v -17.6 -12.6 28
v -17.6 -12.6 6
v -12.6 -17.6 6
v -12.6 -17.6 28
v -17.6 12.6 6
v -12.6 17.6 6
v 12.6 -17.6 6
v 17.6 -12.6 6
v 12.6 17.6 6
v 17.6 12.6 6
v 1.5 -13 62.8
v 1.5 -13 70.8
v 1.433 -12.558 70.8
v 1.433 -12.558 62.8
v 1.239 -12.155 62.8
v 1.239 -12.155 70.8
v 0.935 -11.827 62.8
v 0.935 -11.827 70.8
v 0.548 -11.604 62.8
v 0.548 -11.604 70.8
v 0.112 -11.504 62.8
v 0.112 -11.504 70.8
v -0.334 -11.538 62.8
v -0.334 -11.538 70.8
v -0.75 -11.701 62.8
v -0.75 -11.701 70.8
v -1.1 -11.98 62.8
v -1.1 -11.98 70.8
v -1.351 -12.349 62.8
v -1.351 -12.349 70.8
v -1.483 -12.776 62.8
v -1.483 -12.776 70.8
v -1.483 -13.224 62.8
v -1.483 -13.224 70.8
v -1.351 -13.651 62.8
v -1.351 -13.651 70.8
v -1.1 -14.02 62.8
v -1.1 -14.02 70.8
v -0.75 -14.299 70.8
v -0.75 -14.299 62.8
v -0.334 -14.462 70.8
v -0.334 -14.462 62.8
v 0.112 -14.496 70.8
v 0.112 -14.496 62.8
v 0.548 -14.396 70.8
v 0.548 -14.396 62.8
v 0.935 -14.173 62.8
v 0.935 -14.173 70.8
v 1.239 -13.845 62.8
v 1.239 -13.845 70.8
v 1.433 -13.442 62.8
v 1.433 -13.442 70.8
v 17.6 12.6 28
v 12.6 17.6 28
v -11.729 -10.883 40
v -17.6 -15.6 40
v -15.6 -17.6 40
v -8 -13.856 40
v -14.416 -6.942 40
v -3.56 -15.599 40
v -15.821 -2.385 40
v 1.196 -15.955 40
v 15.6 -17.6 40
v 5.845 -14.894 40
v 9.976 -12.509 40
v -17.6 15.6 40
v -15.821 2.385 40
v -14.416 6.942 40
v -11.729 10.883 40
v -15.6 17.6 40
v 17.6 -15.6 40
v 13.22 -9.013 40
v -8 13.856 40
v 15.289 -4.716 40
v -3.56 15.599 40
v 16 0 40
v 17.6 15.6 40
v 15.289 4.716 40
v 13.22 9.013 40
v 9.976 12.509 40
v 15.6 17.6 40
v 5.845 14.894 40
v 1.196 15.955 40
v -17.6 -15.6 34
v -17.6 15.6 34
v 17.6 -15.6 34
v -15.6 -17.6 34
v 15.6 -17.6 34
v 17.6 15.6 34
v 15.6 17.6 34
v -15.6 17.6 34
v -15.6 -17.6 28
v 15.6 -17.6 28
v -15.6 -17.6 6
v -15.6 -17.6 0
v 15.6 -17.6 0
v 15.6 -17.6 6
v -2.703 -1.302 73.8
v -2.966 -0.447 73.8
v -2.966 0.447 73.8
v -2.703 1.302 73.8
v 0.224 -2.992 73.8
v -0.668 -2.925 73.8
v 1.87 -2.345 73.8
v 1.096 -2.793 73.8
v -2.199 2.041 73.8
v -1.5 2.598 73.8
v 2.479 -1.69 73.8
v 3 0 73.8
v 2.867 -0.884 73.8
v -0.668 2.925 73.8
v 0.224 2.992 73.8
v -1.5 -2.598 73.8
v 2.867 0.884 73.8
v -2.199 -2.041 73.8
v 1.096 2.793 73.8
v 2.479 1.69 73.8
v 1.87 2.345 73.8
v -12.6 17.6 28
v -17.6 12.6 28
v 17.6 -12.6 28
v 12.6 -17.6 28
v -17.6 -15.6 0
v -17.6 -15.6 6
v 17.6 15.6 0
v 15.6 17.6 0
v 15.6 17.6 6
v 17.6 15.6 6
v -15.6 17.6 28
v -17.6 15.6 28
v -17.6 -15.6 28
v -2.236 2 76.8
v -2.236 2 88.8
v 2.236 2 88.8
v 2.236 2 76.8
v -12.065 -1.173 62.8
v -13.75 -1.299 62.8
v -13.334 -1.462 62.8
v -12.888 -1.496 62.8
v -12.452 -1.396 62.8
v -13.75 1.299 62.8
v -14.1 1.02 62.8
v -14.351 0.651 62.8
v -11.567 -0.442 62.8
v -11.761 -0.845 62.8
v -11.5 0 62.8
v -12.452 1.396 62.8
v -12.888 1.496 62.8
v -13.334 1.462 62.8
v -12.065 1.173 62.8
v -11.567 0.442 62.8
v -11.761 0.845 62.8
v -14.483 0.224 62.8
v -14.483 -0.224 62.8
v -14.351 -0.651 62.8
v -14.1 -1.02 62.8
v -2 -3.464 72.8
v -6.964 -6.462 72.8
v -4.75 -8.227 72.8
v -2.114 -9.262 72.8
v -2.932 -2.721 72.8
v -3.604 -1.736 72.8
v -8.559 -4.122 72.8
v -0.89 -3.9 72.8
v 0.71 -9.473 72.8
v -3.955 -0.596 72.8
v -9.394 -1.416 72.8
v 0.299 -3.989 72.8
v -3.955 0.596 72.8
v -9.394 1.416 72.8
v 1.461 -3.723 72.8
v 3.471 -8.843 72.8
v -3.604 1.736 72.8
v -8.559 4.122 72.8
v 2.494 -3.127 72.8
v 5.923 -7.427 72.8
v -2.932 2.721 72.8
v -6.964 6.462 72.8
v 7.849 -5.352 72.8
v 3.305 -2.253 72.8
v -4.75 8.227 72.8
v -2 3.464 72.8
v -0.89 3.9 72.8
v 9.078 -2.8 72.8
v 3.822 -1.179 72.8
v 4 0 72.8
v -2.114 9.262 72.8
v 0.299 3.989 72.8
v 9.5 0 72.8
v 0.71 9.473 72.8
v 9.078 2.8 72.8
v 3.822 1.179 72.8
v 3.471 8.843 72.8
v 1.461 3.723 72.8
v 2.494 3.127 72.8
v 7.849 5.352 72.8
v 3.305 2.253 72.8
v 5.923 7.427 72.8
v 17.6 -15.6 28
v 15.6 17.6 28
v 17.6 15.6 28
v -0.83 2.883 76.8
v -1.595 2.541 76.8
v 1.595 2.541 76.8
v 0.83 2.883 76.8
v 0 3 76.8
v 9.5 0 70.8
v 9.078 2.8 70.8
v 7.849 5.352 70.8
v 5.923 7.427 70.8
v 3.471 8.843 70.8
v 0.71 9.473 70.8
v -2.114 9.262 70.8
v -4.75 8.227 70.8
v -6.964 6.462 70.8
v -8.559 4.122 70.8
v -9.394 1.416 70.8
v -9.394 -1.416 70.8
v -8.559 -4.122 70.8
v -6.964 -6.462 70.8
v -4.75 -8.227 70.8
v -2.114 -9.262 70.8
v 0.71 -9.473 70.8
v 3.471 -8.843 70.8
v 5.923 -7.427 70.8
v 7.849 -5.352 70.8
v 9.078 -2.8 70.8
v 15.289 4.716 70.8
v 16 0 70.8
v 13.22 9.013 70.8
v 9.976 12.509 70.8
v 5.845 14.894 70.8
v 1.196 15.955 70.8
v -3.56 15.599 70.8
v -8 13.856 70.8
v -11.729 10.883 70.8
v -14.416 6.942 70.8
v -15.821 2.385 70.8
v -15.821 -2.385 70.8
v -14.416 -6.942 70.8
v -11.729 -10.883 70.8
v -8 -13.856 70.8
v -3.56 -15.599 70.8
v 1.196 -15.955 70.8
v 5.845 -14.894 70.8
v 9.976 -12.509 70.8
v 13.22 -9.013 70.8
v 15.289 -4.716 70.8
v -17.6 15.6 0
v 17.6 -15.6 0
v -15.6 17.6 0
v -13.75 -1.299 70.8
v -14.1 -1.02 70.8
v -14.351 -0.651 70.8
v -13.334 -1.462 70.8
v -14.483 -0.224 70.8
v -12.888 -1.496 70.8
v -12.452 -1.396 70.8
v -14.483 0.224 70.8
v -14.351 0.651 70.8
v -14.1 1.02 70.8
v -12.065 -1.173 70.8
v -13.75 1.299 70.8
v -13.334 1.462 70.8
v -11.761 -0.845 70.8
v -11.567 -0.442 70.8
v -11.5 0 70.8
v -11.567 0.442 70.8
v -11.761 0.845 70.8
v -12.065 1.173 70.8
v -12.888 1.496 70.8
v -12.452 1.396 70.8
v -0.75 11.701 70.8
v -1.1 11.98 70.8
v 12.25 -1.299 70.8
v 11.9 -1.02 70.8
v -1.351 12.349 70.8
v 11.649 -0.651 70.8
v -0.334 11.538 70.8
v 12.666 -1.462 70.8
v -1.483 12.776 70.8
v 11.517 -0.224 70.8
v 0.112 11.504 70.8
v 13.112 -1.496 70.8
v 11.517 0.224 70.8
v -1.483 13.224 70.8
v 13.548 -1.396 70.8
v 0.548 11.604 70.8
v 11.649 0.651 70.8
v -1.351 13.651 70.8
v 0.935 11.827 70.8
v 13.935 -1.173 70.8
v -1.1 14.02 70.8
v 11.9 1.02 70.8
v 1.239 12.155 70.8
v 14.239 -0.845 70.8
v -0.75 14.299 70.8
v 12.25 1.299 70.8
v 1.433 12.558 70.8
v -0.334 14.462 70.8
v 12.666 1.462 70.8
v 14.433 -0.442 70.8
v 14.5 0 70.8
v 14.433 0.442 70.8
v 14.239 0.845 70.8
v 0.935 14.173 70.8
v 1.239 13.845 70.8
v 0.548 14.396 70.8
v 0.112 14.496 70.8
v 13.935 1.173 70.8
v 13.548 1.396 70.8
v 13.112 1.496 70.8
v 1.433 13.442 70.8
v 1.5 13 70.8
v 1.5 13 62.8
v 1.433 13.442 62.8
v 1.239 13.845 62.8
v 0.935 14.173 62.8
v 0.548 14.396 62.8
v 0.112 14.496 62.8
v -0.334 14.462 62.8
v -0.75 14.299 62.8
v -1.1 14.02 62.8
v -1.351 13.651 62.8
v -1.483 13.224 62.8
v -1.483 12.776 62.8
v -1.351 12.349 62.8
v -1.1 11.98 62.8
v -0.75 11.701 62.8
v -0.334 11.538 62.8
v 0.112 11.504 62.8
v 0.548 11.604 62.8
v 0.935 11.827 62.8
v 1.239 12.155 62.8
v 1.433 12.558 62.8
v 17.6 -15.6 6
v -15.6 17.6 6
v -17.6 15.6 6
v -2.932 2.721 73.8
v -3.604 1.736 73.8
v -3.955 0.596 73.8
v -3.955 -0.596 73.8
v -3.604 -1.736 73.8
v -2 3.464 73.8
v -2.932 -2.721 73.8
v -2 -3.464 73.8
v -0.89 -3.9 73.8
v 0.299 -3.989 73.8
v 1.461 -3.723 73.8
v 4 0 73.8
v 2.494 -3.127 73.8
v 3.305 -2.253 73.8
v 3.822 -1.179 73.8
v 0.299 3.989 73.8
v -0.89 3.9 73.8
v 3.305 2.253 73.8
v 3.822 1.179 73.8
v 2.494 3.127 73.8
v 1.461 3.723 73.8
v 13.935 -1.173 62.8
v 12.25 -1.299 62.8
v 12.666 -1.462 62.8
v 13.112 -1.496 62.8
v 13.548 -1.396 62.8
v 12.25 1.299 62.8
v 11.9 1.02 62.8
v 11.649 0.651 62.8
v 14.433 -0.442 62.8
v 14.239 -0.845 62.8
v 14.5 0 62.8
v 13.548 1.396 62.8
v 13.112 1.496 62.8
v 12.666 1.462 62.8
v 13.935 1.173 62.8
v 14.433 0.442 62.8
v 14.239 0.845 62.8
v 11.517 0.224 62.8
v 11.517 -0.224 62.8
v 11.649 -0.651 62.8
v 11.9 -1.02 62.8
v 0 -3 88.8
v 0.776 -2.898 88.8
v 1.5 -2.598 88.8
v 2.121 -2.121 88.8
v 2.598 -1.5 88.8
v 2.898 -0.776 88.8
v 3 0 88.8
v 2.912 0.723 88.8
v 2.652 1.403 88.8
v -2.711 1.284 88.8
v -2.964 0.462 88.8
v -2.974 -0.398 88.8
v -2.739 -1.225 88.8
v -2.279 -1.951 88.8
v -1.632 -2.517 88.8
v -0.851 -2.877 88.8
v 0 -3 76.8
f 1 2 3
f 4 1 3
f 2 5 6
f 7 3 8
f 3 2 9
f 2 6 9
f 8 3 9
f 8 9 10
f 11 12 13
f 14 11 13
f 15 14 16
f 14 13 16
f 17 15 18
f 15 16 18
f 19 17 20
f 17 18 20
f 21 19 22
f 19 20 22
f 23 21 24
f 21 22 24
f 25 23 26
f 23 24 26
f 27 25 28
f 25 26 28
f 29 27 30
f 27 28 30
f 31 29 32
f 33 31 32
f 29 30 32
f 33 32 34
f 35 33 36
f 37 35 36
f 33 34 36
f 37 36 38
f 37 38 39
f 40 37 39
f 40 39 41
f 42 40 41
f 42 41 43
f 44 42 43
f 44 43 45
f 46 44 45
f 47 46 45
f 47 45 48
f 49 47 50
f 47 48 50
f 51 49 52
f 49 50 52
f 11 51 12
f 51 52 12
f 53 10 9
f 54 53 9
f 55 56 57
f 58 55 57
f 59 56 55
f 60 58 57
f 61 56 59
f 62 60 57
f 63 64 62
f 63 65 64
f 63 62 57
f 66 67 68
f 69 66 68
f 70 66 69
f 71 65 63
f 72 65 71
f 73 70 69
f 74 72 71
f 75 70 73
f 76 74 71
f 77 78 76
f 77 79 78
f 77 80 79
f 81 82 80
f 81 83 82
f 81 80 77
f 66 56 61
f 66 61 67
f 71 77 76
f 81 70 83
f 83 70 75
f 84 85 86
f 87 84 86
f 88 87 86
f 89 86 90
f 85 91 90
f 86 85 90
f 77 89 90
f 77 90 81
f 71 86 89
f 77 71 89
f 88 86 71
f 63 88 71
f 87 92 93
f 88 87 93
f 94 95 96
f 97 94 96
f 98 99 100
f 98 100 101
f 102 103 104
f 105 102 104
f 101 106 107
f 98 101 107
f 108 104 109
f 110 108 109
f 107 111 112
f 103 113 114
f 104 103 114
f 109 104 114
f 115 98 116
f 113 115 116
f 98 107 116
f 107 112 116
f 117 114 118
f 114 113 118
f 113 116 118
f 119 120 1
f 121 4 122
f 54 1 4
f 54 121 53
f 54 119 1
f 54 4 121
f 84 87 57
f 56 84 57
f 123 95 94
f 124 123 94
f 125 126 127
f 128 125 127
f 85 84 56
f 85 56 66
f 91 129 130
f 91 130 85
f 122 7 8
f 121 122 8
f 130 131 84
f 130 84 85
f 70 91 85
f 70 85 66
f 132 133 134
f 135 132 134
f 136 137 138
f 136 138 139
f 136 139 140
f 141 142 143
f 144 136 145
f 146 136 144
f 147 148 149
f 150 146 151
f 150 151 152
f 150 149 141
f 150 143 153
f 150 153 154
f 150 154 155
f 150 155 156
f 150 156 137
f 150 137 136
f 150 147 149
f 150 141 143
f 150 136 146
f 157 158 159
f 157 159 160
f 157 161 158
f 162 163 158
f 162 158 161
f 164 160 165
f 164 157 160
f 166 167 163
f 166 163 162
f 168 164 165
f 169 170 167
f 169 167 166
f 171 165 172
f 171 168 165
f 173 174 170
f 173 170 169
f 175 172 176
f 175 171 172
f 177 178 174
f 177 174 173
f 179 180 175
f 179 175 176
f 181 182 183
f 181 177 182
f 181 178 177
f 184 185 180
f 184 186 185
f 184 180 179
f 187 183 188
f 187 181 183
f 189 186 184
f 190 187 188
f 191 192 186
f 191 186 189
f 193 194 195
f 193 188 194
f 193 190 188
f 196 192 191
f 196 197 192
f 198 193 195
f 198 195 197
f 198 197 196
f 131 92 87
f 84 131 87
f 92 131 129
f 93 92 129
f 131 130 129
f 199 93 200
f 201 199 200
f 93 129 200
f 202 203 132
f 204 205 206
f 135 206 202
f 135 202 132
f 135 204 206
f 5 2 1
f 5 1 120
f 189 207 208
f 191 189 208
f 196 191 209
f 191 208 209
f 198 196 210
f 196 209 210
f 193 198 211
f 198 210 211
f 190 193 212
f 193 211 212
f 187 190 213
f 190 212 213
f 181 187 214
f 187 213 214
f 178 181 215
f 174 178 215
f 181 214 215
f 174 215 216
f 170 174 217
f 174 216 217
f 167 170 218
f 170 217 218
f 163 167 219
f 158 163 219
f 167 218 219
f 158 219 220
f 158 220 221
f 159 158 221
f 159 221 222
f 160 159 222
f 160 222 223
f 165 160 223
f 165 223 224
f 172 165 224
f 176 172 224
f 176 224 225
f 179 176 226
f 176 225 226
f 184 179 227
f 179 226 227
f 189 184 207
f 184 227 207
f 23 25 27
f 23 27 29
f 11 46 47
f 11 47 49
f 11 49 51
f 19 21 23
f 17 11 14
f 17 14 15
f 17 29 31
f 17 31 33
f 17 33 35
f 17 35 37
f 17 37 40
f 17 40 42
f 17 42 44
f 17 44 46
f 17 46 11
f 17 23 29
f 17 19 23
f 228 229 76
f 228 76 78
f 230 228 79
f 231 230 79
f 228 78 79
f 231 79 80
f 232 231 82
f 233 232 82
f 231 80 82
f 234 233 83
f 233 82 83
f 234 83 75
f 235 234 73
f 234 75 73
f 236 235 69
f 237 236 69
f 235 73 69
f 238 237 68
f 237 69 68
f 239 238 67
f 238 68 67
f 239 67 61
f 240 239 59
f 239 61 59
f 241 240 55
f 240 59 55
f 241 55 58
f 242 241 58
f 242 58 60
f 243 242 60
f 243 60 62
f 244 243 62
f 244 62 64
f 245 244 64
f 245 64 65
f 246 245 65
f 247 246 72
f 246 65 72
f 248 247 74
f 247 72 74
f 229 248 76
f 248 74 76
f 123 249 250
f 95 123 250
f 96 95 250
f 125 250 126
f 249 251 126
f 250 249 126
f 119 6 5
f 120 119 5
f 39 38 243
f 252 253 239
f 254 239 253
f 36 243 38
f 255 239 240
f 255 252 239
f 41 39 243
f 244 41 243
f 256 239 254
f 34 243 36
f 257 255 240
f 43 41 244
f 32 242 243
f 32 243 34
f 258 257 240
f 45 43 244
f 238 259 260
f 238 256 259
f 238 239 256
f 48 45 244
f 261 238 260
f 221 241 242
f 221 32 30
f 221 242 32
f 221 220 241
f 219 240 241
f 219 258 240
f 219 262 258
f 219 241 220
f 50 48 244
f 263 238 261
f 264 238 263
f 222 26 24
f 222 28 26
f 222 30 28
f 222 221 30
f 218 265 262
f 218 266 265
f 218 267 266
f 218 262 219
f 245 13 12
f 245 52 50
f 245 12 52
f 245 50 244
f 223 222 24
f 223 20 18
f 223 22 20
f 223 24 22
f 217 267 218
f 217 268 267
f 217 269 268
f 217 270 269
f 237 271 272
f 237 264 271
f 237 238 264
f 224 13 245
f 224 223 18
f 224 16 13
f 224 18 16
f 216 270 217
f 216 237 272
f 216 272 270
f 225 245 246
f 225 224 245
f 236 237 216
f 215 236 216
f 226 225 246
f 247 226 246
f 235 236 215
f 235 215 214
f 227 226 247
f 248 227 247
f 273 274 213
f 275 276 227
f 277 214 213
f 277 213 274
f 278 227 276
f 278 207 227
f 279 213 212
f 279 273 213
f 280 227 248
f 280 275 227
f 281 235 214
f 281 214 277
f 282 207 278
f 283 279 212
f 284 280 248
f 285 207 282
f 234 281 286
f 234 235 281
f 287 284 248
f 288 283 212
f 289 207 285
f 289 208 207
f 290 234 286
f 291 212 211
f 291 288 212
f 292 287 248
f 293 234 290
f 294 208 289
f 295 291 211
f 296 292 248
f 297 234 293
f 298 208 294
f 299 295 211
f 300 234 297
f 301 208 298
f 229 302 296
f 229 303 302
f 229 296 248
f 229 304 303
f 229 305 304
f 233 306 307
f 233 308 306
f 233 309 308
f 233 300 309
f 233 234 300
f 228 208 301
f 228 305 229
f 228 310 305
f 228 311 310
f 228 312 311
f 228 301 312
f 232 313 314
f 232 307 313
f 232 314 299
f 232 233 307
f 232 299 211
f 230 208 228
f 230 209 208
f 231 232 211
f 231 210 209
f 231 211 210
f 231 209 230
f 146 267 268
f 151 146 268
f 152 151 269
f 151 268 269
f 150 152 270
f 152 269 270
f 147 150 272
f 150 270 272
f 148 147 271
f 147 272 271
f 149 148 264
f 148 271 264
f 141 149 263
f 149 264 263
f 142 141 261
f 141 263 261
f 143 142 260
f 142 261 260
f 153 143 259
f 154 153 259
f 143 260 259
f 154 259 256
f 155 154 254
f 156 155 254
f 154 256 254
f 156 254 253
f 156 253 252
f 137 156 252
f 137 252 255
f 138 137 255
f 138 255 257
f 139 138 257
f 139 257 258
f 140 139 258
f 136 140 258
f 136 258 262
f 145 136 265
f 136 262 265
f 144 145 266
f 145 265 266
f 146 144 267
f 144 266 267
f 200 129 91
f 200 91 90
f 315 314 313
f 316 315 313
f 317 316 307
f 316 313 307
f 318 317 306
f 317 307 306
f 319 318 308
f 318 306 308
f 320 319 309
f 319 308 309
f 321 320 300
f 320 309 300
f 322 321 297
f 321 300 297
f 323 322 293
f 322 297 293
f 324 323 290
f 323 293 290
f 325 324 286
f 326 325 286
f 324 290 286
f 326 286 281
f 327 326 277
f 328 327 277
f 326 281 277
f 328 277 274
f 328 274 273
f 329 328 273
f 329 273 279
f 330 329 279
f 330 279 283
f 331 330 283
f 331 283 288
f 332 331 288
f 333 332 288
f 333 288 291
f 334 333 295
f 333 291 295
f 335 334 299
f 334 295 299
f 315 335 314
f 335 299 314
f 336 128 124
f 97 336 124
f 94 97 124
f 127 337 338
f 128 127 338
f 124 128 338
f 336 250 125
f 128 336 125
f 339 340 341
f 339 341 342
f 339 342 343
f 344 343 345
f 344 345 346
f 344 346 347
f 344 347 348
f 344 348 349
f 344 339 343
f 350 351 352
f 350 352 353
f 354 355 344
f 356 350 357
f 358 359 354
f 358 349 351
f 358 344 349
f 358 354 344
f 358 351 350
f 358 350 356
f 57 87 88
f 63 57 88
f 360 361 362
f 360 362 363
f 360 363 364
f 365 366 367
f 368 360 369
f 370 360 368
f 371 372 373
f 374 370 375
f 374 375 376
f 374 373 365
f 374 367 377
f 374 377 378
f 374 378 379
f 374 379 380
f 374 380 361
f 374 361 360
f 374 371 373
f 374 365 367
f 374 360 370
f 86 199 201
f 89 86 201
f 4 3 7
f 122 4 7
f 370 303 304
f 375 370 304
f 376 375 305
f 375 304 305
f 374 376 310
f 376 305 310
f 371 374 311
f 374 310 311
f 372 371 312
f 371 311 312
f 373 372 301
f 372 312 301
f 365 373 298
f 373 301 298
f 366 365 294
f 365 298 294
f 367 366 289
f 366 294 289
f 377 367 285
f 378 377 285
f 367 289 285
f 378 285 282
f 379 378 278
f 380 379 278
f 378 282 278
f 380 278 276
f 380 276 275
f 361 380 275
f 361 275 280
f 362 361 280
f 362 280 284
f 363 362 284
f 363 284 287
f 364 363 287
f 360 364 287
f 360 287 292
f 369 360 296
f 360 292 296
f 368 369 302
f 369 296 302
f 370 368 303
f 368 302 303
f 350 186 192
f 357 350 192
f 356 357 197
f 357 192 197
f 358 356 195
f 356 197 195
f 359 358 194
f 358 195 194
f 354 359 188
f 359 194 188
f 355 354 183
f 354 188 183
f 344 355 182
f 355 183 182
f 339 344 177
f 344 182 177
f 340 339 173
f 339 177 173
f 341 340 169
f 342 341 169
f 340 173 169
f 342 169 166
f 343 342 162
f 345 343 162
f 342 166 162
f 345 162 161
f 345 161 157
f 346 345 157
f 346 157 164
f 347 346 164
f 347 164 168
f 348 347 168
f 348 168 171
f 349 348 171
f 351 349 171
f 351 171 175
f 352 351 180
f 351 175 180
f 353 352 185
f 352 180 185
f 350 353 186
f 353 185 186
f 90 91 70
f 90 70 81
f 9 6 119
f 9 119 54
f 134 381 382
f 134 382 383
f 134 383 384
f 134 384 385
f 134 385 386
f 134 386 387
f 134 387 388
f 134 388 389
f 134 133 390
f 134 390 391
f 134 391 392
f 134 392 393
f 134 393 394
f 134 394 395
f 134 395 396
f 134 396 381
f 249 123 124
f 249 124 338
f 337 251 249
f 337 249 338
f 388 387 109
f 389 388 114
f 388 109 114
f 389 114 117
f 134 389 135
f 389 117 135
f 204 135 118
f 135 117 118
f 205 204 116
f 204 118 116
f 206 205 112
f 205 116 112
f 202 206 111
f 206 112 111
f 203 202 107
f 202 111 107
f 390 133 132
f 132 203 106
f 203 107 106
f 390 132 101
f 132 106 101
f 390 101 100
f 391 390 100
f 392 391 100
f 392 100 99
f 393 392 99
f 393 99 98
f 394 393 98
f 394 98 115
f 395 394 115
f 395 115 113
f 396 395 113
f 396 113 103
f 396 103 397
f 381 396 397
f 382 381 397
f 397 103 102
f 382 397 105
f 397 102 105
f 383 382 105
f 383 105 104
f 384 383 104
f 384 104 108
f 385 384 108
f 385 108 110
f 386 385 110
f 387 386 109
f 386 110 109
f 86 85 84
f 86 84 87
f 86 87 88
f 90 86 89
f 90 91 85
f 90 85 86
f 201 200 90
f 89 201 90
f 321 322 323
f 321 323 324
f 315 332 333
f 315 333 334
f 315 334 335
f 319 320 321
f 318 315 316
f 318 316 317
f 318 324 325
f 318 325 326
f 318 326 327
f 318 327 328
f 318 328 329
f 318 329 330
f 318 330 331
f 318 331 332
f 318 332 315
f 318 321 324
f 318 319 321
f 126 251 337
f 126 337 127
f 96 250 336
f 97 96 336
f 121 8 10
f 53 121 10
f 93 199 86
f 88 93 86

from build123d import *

# Parameters (mm, degrees)
ESQUISSE1_W             = 35.2
ESQUISSE1_H             = 35.2
BOSS_EXTRU_1_DEPTH      = 34
ESQUISSE2_W             = 35.2
ESQUISSE2_H             = 35.2
BOSS_EXTRU_2_DEPTH      = 6
ESQUISSE3_R             = 16
BOSS_EXTRU_3_DEPTH      = 30.8
ESQUISSE4_R             = 9.5
BOSS_EXTRU_4_DEPTH      = 2
ESQUISSE5_R             = 4
BOSS_EXTRU_5_DEPTH      = 1
ESQUISSE6_R             = 3
BOSS_EXTRU_6_DEPTH      = 15
ESQUISSE7_OUTSIDE_W     = 57.56
ESQUISSE7_OUTSIDE_H     = 57.56
ESQUISSE7_OUTSIDE_W_2   = 8.389084627
ESQUISSE7_OUTSIDE_H_2   = 5
ENL_V_MAT_EXTRU_1_DEPTH = 12
ESQUISSE8_R             = 1.5
ENL_V_MAT_EXTRU_2_DEPTH = 8
CHANFREIN1_SIZE         = 2
CHANFREIN2_SIZE         = 2
ESQUISSE9_OUTSIDE_W     = 57.56
ESQUISSE9_OUTSIDE_H     = 57.56
ENL_V_MAT_EXTRU_3_DEPTH = 22


# Read off the part's stored shape, not the designer's step: Intersect1, Intersect2
with BuildPart() as part:
    # Esquisse1 → Boss.-Extru.1 (new body)
    with BuildSketch(Plane.XY):
        Rectangle(ESQUISSE1_W, ESQUISSE1_H)
    extrude(amount=BOSS_EXTRU_1_DEPTH)

    # Chanfrein1
    chanfrein1_edges = [part.edges().sort_by_distance(p)[0] for p in [
        (-17.6, 17.6, 17),
        (17.6, 17.6, 17),
        (17.6, -17.6, 17),
        (-17.6, -17.6, 17),
    ]]
    chamfer(chanfrein1_edges, length=CHANFREIN1_SIZE)

    # Esquisse9 outside → Enlèv. mat.-Extru.3 (cut)
    with BuildSketch(Plane(origin=(0, 0, 6), x_dir=(-1, 0, 0), z_dir=(0, 0, -1))):
        Rectangle(ESQUISSE9_OUTSIDE_W, ESQUISSE9_OUTSIDE_H)
        Polygon((-17.6, -12.6), (-17.6, 12.6), (-12.6, 17.6), (12.6, 17.6), (17.6, 12.6), (17.6, -12.6), (12.6, -17.6), (-12.6, -17.6), align=None, mode=Mode.SUBTRACT)
    extrude(amount=-ENL_V_MAT_EXTRU_3_DEPTH, mode=Mode.SUBTRACT)


with BuildPart() as body_2:
    # Esquisse2 → Boss.-Extru.2 (new body)
    with BuildSketch(Plane.XY.offset(34)):
        Rectangle(ESQUISSE2_W, ESQUISSE2_H)
    extrude(amount=BOSS_EXTRU_2_DEPTH)

    # Esquisse3 → Boss.-Extru.3 (add)
    with BuildSketch(Plane.XY.offset(40)):
        Circle(ESQUISSE3_R)
    extrude(amount=BOSS_EXTRU_3_DEPTH)

    # Esquisse4 → Boss.-Extru.4 (add)
    with BuildSketch(Plane.XY.offset(70.8)):
        Circle(ESQUISSE4_R)
    extrude(amount=BOSS_EXTRU_4_DEPTH)

    # Esquisse5 → Boss.-Extru.5 (add)
    with BuildSketch(Plane.XY.offset(72.8)):
        Circle(ESQUISSE5_R)
    extrude(amount=BOSS_EXTRU_5_DEPTH)

    # Esquisse8 → Enlèv. mat.-Extru.2 (cut)
    with BuildSketch(Plane.XY.offset(70.8)):
        with Locations((0, 13)):
            Circle(ESQUISSE8_R)
        with Locations((13, 0)):
            Circle(ESQUISSE8_R)
        with Locations((0, -13)):
            Circle(ESQUISSE8_R)
        with Locations((-13, 0)):
            Circle(ESQUISSE8_R)
    extrude(amount=-ENL_V_MAT_EXTRU_2_DEPTH, mode=Mode.SUBTRACT)

    # Chanfrein2
    chanfrein2_edges = [body_2.edges().sort_by_distance(p)[0] for p in [
        (17.6, 17.6, 37),
        (17.6, -17.6, 37),
        (-17.6, -17.6, 37),
        (-17.6, 17.6, 37),
    ]]
    chamfer(chanfrein2_edges, length=CHANFREIN2_SIZE)


with BuildPart() as body_3:
    # Esquisse6 → Boss.-Extru.6 (new body)
    with BuildSketch(Plane.XY.offset(73.8)):
        Circle(ESQUISSE6_R)
    extrude(amount=BOSS_EXTRU_6_DEPTH)

    # Esquisse7 outside → Enlèv. mat.-Extru.1 (cut)
    with BuildSketch(Plane.XY.offset(88.8)):
        Rectangle(ESQUISSE7_OUTSIDE_W, ESQUISSE7_OUTSIDE_H)
        with Locations((0.120470513, -0.5)):
            Rectangle(ESQUISSE7_OUTSIDE_W_2, ESQUISSE7_OUTSIDE_H_2, mode=Mode.SUBTRACT)
    extrude(amount=-ENL_V_MAT_EXTRU_1_DEPTH, mode=Mode.SUBTRACT)


with BuildPart() as body_4:
    # Intersect1: the piece on the far side of the plane
    add(part.part)
    split(bisect_by=Plane.XY.offset(28), keep=Keep.BOTTOM)


with BuildPart() as part_1:
    add(part.part)

    # Intersect1
    split(bisect_by=Plane.XY.offset(28), keep=Keep.TOP)


with BuildPart() as body_5:
    # Intersect2: the piece on the far side of the plane
    add(body_4.part)
    split(bisect_by=Plane.XY.offset(6), keep=Keep.BOTTOM)


with BuildPart() as body_4_1:
    add(body_4.part)

    # Intersect2
    split(bisect_by=Plane.XY.offset(6), keep=Keep.TOP)


solid = Compound([body_2.part, body_3.part, part_1.part, body_5.part, body_4_1.part])
